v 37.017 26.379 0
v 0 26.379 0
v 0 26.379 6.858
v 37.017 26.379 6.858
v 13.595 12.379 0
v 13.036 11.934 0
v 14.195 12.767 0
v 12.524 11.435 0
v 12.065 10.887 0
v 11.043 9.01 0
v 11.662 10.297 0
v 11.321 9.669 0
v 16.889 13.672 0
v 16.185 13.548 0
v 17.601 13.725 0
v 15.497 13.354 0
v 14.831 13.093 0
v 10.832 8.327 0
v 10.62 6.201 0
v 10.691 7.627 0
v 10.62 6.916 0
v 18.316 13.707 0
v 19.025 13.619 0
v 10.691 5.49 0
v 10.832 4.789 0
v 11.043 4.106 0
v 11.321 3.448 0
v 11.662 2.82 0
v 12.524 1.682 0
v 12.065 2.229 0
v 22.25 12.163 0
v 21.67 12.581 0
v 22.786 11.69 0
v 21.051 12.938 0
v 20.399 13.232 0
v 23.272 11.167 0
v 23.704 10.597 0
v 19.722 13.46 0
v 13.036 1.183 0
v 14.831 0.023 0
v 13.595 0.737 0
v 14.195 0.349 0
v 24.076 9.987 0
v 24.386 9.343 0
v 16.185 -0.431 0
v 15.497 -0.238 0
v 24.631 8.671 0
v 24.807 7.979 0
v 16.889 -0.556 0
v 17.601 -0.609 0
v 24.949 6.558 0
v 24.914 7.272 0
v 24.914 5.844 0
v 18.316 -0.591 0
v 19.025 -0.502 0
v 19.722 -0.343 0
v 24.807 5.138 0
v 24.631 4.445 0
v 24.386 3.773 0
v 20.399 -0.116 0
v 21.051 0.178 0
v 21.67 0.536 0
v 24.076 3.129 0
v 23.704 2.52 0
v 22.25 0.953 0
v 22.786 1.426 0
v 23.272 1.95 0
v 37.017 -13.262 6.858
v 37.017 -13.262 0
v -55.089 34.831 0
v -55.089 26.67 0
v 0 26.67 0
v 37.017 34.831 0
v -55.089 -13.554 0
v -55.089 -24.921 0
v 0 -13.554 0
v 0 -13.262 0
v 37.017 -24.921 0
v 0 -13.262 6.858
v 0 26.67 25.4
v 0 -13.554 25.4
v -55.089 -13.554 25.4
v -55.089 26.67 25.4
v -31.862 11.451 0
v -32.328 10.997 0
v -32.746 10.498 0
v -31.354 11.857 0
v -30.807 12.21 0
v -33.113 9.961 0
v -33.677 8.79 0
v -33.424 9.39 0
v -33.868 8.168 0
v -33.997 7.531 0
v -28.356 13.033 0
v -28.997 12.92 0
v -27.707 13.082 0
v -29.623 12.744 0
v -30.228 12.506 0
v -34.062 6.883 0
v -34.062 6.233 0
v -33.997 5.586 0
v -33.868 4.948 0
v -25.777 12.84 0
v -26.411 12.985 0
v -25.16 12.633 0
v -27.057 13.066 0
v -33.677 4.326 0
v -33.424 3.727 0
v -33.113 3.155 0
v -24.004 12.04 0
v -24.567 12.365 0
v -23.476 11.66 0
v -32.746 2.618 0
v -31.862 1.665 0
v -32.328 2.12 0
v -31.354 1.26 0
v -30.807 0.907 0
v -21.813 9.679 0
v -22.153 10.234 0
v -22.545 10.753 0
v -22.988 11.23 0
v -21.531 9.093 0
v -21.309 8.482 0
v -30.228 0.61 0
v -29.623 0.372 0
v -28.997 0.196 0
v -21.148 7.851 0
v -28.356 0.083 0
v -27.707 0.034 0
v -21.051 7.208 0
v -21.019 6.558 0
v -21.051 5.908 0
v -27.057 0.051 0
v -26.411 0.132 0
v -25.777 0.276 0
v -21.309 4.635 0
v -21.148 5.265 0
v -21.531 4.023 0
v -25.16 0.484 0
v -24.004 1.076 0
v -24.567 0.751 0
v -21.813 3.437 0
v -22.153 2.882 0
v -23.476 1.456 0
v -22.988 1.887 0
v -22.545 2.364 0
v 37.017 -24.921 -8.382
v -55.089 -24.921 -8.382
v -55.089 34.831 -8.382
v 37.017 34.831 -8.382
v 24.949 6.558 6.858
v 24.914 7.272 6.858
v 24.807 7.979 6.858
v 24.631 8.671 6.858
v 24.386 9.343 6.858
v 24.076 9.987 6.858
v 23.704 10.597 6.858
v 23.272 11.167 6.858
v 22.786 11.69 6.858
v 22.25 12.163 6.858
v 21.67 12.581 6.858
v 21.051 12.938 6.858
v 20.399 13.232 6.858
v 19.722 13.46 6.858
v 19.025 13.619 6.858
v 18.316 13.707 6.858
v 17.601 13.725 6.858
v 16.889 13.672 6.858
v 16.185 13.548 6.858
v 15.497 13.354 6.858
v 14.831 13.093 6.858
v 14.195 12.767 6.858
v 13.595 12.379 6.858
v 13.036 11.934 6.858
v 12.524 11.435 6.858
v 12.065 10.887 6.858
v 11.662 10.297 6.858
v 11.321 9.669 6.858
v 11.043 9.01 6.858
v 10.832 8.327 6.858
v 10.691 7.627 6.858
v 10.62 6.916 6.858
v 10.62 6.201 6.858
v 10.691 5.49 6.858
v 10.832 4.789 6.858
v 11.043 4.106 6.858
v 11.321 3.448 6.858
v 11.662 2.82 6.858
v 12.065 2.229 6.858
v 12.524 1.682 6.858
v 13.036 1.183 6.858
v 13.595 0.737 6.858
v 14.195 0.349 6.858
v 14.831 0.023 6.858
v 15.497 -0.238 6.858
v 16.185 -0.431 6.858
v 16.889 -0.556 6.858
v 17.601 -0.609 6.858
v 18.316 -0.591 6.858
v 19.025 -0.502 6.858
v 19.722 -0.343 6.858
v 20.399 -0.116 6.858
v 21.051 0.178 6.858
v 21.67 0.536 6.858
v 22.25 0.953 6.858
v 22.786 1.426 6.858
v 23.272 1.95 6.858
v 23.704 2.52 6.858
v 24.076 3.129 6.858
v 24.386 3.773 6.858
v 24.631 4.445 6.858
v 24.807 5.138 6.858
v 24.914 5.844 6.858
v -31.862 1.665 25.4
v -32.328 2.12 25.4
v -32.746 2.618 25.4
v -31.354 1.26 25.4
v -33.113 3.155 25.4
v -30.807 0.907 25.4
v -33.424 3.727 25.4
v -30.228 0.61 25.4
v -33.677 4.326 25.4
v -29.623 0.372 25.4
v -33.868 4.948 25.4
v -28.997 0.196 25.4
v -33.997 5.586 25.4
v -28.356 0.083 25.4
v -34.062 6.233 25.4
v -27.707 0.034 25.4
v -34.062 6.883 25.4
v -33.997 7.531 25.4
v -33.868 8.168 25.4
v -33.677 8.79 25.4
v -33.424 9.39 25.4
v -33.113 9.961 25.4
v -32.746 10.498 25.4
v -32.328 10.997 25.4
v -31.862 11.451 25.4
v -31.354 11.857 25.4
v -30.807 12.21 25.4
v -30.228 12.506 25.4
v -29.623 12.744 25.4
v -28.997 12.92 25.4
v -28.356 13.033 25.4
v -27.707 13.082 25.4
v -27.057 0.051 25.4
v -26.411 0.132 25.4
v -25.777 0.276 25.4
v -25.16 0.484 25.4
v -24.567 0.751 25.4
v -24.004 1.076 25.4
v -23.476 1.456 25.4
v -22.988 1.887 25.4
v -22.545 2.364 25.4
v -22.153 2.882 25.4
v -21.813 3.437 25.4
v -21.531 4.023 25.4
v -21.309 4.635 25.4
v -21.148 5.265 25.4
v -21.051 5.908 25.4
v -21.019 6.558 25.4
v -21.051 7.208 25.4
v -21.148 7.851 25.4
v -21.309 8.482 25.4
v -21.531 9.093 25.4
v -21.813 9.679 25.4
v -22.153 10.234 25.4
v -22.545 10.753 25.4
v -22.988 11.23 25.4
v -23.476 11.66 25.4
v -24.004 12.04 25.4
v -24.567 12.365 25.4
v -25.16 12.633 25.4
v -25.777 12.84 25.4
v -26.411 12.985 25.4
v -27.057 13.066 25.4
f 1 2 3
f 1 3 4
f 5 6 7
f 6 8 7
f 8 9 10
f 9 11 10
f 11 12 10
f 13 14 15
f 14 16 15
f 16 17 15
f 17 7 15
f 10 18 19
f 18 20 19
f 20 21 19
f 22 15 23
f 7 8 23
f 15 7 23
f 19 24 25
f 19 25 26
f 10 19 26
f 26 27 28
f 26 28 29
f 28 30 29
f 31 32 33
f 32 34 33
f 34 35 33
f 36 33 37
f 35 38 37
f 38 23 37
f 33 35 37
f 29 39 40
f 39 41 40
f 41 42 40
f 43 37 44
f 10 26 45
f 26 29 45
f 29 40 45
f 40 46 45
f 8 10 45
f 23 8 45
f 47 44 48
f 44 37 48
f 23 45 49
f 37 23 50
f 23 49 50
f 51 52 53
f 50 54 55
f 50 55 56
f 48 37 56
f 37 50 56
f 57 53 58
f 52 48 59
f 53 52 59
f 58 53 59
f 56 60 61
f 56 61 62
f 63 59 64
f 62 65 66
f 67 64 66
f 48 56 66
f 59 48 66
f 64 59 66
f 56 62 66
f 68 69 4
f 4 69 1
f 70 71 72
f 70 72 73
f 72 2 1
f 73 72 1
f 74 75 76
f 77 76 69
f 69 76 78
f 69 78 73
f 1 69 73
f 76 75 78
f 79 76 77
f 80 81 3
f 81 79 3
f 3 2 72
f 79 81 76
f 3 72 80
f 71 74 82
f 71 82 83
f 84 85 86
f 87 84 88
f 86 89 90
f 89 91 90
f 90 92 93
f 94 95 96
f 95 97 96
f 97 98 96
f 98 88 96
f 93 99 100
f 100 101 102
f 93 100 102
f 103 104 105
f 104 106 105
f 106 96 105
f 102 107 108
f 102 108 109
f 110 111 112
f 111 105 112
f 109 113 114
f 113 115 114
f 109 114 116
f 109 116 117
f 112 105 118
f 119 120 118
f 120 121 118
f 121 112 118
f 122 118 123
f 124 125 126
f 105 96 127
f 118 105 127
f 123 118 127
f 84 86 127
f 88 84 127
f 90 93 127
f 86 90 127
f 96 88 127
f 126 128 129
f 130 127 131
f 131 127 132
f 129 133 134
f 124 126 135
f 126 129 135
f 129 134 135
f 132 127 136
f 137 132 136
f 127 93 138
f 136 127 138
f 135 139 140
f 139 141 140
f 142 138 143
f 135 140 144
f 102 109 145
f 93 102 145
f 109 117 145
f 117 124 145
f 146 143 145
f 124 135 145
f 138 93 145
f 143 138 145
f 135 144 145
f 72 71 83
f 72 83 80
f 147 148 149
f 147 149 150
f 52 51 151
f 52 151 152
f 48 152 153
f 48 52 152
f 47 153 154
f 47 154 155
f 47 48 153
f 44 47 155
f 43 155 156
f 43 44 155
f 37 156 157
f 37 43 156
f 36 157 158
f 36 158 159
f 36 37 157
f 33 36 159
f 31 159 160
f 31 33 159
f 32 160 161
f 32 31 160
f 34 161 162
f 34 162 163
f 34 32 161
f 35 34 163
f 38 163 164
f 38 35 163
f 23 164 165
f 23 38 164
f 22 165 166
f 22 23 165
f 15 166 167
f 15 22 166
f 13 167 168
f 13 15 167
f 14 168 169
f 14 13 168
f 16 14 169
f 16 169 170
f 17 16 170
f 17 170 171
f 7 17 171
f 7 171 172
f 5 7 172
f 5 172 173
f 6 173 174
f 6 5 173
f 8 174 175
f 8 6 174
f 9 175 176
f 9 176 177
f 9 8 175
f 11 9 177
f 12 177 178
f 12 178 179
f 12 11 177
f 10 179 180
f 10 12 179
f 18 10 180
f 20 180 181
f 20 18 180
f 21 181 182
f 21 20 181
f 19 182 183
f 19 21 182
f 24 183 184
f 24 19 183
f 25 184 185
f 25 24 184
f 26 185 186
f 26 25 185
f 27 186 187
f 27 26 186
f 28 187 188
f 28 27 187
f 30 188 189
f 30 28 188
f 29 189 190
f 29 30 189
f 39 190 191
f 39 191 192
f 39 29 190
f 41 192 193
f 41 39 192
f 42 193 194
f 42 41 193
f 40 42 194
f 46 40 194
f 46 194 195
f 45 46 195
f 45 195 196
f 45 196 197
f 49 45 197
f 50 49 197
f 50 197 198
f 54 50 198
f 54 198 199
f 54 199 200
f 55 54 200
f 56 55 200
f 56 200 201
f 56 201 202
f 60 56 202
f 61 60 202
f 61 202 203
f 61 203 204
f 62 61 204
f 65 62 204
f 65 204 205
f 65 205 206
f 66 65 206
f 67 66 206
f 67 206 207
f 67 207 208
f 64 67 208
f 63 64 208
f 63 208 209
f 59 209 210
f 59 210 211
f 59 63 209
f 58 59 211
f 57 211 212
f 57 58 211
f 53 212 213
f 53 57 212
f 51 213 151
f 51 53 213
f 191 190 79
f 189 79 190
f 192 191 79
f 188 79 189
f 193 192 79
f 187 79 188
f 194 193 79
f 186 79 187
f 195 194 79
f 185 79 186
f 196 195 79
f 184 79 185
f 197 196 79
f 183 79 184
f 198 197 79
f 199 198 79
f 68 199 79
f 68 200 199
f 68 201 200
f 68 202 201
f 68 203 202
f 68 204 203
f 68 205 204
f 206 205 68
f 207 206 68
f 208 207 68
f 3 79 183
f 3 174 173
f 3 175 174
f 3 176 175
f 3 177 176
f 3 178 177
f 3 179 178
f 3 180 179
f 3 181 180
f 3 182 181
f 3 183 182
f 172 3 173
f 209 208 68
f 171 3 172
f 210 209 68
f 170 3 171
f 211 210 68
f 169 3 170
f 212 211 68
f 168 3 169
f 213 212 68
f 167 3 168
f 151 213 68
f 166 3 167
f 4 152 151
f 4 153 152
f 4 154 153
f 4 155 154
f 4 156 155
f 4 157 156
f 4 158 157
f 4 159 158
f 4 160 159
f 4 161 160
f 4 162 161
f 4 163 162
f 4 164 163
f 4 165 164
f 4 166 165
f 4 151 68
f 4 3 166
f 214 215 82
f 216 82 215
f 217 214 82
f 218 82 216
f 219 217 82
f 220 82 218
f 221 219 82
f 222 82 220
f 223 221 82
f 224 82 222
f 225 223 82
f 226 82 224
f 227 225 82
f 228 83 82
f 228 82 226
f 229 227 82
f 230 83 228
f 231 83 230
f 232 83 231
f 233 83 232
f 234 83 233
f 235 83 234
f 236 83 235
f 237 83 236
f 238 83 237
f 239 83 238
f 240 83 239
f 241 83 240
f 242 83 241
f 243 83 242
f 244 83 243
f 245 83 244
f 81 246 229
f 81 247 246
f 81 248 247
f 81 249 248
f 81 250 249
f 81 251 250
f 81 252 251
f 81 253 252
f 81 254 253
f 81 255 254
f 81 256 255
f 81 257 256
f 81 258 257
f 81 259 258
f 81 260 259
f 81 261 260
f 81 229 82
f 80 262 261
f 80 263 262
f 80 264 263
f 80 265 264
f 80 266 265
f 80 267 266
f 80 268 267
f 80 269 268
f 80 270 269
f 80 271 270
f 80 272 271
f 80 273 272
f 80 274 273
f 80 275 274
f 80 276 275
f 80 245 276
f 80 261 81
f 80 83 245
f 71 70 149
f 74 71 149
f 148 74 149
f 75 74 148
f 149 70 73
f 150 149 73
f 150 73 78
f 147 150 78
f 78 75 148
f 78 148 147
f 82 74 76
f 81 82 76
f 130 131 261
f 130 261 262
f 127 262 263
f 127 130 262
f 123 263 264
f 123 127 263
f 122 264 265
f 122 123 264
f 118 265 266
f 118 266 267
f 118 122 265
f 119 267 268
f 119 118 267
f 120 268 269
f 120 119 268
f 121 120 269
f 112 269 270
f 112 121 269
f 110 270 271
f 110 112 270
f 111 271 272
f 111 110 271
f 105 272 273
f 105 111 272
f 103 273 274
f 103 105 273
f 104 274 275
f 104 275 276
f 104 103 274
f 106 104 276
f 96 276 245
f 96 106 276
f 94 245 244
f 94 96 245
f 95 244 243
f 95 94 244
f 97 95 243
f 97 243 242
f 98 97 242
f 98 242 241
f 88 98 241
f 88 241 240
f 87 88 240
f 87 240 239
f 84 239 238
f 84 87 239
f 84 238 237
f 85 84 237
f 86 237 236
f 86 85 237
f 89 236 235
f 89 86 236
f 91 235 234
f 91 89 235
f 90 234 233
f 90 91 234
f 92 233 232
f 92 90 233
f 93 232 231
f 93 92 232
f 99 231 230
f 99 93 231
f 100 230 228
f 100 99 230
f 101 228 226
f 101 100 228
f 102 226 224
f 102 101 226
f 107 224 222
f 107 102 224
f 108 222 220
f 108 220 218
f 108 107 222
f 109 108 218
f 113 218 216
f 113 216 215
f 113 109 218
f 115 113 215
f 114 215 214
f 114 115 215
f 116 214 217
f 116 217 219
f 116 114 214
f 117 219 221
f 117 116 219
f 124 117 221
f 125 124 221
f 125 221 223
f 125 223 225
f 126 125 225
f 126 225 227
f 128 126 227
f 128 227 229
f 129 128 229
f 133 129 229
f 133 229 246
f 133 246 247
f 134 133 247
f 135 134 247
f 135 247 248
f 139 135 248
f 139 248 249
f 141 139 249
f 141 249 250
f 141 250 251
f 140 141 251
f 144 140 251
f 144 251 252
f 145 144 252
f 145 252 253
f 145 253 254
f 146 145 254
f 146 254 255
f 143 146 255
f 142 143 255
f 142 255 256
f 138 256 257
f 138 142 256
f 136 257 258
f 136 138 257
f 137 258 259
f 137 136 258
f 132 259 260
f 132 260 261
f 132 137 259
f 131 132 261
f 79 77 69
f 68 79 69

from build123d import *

# Parameters (mm, degrees)
F0_W     = 55.088852
F0_H     = 40.223607
F0_R     = 6.52573
F1_DEPTH = 25.4
F2_W     = 37.017379
F2_H     = 39.640654
F2_R     = 7.169346
F3_DEPTH = 6.858
F4_W     = 92.106231
F4_H     = 59.752459
F5_DEPTH = 8.382


with BuildPart() as f1:
    # F0 (on Top) → F1 (new body)
    with BuildSketch(Plane.XY):
        with Locations((-27.544426, 6.558197)):
            Rectangle(F0_W, F0_H)
        with Locations((-27.544426, 6.558198)):
            Circle(F0_R, mode=Mode.SUBTRACT)
    extrude(amount=F1_DEPTH)

    # F2 (on Top) → F3 (join)
    with BuildSketch(Plane.XY):
        with Locations((18.508689, 6.558197)):
            Rectangle(F2_W, F2_H)
        with Locations((17.78, 6.558197)):
            Circle(F2_R, mode=Mode.SUBTRACT)
    extrude(amount=F3_DEPTH)

    # F4 (on face) → F5 (join)
    with BuildSketch(Plane(origin=(0, 0, 0), x_dir=(1, 0, 0), z_dir=(0, 0, -1))):
        with Locations((-9.035736, -4.955082)):
            Rectangle(F4_W, F4_H)
    extrude(amount=F5_DEPTH)


solid = f1.part
